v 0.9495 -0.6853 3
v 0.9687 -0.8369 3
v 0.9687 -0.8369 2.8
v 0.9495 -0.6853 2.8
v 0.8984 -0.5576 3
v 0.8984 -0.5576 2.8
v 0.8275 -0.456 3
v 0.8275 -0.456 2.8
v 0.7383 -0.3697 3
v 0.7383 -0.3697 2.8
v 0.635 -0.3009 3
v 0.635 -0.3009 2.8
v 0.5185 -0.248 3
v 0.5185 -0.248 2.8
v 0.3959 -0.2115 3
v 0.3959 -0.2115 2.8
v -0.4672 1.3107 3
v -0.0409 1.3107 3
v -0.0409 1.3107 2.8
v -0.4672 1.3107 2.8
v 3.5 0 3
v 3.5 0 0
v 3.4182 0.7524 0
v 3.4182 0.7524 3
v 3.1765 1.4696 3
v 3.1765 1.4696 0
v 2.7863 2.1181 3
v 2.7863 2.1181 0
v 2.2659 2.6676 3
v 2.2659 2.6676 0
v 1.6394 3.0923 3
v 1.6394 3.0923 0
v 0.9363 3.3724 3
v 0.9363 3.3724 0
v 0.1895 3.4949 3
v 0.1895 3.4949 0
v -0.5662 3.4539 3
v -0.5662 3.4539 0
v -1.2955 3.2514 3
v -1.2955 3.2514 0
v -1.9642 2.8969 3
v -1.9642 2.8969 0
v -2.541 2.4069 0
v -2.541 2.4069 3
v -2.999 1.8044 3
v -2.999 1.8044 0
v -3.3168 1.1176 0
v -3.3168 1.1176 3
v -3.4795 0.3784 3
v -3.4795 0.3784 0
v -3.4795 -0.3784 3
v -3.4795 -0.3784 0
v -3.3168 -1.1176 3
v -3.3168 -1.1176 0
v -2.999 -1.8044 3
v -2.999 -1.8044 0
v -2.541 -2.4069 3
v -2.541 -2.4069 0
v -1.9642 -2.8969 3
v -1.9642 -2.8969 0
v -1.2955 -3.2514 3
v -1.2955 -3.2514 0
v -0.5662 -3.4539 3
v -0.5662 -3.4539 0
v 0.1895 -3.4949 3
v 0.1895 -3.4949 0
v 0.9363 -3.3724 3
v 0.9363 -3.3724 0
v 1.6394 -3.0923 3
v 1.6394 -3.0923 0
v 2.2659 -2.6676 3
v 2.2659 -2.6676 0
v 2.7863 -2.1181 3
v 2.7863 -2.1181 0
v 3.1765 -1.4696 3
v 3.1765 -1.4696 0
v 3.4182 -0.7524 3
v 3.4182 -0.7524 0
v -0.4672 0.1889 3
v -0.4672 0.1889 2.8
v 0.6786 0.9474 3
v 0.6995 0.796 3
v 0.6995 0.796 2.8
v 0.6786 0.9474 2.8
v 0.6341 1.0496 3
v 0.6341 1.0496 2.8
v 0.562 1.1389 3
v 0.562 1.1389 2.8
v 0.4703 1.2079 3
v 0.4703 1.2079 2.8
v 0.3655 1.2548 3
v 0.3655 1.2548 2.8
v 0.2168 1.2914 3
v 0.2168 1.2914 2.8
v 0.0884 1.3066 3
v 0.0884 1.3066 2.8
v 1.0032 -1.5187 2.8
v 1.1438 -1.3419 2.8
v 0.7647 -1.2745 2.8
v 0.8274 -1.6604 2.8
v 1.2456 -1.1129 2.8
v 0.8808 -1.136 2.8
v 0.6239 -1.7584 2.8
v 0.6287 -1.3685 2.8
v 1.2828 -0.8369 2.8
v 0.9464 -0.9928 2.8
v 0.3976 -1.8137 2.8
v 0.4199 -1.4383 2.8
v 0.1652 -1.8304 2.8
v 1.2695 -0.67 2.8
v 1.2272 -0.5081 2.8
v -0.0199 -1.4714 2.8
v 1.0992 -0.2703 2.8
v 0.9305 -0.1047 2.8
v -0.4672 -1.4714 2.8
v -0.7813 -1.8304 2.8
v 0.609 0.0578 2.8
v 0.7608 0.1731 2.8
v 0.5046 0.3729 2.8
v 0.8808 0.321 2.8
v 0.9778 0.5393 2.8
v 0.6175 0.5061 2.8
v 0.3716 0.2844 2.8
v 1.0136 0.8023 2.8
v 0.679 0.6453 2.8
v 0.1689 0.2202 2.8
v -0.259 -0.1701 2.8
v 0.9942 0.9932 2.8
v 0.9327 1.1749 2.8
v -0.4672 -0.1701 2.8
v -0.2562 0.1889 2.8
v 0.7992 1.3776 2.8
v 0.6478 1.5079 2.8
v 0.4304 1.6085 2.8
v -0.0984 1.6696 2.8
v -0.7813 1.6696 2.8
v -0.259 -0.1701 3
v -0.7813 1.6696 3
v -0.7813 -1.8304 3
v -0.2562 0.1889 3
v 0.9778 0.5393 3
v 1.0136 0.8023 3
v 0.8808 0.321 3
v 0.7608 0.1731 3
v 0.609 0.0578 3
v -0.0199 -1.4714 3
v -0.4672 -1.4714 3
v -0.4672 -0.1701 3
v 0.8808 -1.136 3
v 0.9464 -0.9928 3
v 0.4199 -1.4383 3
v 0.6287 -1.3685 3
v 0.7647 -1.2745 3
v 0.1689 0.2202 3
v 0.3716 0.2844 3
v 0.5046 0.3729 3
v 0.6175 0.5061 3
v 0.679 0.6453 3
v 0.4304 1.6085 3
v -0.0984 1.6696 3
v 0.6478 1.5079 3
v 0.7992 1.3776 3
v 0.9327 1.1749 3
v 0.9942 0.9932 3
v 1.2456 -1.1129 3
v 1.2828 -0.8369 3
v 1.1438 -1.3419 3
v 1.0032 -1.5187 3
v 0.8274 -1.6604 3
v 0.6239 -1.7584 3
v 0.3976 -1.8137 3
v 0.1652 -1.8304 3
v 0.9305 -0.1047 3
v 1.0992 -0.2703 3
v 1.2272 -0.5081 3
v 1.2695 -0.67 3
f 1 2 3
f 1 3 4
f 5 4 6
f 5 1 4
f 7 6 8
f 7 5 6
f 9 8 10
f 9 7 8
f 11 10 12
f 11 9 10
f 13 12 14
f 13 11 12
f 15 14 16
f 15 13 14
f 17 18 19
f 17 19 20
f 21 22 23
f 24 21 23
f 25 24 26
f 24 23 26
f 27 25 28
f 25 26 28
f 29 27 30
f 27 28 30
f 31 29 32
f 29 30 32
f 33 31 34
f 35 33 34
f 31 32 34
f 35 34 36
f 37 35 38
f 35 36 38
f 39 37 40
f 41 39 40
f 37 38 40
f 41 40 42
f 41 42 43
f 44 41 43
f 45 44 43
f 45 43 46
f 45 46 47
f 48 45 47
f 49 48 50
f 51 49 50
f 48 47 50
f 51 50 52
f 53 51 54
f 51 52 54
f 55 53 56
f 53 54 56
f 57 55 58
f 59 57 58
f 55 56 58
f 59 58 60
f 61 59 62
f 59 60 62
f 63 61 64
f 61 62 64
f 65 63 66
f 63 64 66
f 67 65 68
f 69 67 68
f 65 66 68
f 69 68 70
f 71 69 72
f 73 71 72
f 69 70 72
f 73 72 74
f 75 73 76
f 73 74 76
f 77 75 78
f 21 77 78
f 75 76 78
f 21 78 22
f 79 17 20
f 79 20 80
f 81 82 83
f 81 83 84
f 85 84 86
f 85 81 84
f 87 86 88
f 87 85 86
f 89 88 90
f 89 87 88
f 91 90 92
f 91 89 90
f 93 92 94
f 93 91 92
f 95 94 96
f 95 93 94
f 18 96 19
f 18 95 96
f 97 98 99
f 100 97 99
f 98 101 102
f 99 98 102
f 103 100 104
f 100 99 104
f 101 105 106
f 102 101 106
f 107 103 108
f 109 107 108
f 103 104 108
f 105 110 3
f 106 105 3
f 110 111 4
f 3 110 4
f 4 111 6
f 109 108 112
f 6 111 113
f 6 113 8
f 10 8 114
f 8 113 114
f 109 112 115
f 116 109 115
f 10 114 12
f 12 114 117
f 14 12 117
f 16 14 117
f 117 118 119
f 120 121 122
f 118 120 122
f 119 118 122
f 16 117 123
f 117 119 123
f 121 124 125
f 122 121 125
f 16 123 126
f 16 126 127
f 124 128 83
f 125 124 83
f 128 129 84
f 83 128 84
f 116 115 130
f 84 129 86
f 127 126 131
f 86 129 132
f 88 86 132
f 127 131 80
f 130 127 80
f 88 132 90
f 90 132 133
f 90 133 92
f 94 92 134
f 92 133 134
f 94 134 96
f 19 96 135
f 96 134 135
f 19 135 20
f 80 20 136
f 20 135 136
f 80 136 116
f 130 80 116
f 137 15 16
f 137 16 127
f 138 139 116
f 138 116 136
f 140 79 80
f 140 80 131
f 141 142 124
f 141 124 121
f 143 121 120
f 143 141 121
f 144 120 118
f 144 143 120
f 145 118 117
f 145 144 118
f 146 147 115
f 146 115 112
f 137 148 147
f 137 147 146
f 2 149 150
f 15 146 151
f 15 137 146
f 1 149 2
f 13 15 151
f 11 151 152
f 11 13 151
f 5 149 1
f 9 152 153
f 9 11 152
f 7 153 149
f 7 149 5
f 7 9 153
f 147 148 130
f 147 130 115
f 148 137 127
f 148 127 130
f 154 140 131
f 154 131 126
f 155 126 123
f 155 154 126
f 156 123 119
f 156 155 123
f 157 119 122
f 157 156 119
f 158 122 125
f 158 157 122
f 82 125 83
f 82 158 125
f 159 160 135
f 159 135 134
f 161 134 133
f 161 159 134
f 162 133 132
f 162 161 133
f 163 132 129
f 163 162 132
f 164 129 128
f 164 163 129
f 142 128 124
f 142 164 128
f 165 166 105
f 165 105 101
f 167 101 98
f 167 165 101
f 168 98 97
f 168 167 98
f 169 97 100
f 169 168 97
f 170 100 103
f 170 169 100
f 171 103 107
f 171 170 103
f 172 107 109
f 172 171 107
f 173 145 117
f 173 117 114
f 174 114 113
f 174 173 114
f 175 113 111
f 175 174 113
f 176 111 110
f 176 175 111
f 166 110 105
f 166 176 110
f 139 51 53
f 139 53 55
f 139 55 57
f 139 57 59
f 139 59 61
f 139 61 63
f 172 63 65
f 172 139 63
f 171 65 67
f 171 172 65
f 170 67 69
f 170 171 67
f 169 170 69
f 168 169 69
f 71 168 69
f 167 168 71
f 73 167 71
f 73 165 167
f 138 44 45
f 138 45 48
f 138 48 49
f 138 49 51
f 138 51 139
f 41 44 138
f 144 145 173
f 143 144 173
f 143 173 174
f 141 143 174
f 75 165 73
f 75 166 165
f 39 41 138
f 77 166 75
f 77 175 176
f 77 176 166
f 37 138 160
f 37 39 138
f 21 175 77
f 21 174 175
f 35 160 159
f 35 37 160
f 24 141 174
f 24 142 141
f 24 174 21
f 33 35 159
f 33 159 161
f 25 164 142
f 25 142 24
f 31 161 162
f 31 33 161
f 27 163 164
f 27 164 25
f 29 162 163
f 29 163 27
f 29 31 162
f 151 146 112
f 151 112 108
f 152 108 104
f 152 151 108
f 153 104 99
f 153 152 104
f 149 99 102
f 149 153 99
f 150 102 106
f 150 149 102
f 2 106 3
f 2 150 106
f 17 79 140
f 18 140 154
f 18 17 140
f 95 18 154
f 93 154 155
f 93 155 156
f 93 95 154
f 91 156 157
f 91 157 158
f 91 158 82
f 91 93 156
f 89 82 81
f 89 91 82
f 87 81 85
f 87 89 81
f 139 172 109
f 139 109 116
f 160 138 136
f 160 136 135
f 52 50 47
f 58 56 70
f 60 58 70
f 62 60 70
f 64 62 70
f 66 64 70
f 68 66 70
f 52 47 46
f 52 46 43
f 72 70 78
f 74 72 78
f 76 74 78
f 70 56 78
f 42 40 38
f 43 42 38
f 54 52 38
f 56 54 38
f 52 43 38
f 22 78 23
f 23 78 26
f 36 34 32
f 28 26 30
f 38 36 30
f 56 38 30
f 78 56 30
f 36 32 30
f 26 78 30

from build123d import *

# Parameters (mm, degrees)
SKETCH1_R           = 3.5
BOSS_EXTRUDE1_DEPTH = 3
CUT_EXTRUDE1_DEPTH  = 0.2


with BuildPart() as part:
    # Sketch1 → Boss-Extrude1 (new body)
    with BuildSketch(Plane.XY):
        Circle(SKETCH1_R)
    extrude(amount=BOSS_EXTRUDE1_DEPTH)

    # Sketch2 → Cut-Extrude1 (cut)
    with BuildSketch(Plane.XY.offset(3)):
        with BuildLine():
            Line((-0.781290974, 1.669629579), (-0.098398346, 1.669629579))
            add(Edge.make_bspline(
                [(-0.098398346, 1.669629579), (-0.064969868, 1.669453828), (-0.000177158, 1.66911318), (0.094042284, 1.663830049), (0.182291095, 1.656626379), (0.264594867, 1.645196287), (0.34091557, 1.63140451), (0.411483207, 1.614702693), (0.476073379, 1.59467608), (0.553186116, 1.562829799), (0.641106776, 1.51550663), (0.736305169, 1.445578065), (0.817709408, 1.360045602), (0.887895726, 1.263562947), (0.943696845, 1.157427175), (0.984066143, 1.044167986), (1.009624018, 0.925246244), (1.012252452, 0.843603066), (1.013580821, 0.802341919)],
                knots=[0, 0, 0, 0, 0.00010027, 0.000194349, 0.000283026, 0.000365821, 0.000443519, 0.000515622, 0.000583254, 0.00064614, 0.000765662, 0.000881909, 0.000998927, 0.001118415, 0.001238844, 0.00135727, 0.001478274, 0.001601912, 0.001601912, 0.001601912, 0.001601912], degree=3))
            add(Edge.make_bspline(
                [(1.013580821, 0.802341919), (1.012487602, 0.763689363), (1.010339325, 0.687733446), (0.989796565, 0.576639337), (0.957635897, 0.470888118), (0.912930648, 0.370865732), (0.854828652, 0.278832119), (0.785970333, 0.194044853), (0.70289353, 0.120093796), (0.64065029, 0.078750894), (0.609033545, 0.057750572)],
                knots=[0, 0, 0, 0, 0.000115857, 0.00022767, 0.000337672, 0.000446877, 0.000555233, 0.000663318, 0.000773539, 0.000887324, 0.000887324, 0.000887324, 0.000887324], degree=3))
            add(Edge.make_bspline(
                [(0.609033545, 0.057750572), (0.648793972, 0.042485573), (0.72486552, 0.013279849), (0.829551532, -0.038355615), (0.919746377, -0.094517725), (0.996143523, -0.155849575), (1.061481178, -0.221958386), (1.11853412, -0.293813501), (1.167215494, -0.372352258), (1.208928417, -0.456755794), (1.241477174, -0.546162262), (1.265853078, -0.639733038), (1.279820527, -0.737132593), (1.281808168, -0.803417973), (1.28281159, -0.836880838)],
                knots=[0, 0, 0, 0, 0.000127722, 0.000244363, 0.000349599, 0.000445847, 0.000537565, 0.000627901, 0.000720503, 0.000814257, 0.000909859, 0.001005428, 0.001103887, 0.001204268, 0.001204268, 0.001204268, 0.001204268], degree=3))
            add(Edge.make_bspline(
                [(1.28281159, -0.836880838), (1.281834744, -0.87104771), (1.279912772, -0.938271988), (1.2657328, -1.037027123), (1.241723693, -1.131402069), (1.208652547, -1.222007252), (1.165490232, -1.308667386), (1.112962268, -1.39148065), (1.050330704, -1.469614981), (0.980267835, -1.543938604), (0.90100569, -1.610766391), (0.815489935, -1.670282098), (0.722643615, -1.71922816), (0.623991621, -1.760344182), (0.518427305, -1.79175138), (0.406424697, -1.813723954), (0.288080396, -1.828528991), (0.206870644, -1.829746196), (0.165223449, -1.830370421)],
                knots=[0, 0, 0, 0, 0.000102481, 0.000201635, 0.000298562, 0.000394165, 0.000490425, 0.000588455, 0.000687769, 0.000790423, 0.000894381, 0.000998232, 0.001102369, 0.001208616, 0.001318415, 0.001432129, 0.001550749, 0.00167562, 0.00167562, 0.00167562, 0.00167562], degree=3))
            Line((0.165223449, -1.830370421), (-0.781290974, -1.830370421))
            Line((-0.781290974, -1.830370421), (-0.781290974, 1.669629579))
        make_face()
        with BuildLine():
            Line((-0.46718841, 1.31065522), (-0.46718841, 0.188860348))
            Line((-0.46718841, 0.188860348), (-0.25615075, 0.188860348))
            add(Edge.make_bspline(
                [(-0.25615075, 0.188860348), (-0.225301955, 0.189260271), (-0.165695795, 0.190033004), (-0.079375899, 0.192246521), (0.000749119, 0.198444564), (0.074540952, 0.204640826), (0.141883396, 0.214715414), (0.202627258, 0.226707537), (0.257725855, 0.239390442), (0.3212654, 0.260959929), (0.393338349, 0.292837604), (0.470171453, 0.34230944), (0.537905923, 0.401233793), (0.59510311, 0.469224755), (0.641914581, 0.544090941), (0.674428296, 0.624637821), (0.69647558, 0.708857953), (0.698467112, 0.766676206), (0.699478256, 0.796031822)],
                knots=[0, 0, 0, 0, 9.2559e-05, 0.000178842, 0.000258967, 0.000333616, 0.000400942, 0.000463093, 0.000519379, 0.000570374, 0.000664201, 0.000755025, 0.000843472, 0.000932526, 0.001020669, 0.001107124, 0.001192318, 0.001280185, 0.001280185, 0.001280185, 0.001280185], degree=3))
            add(Edge.make_bspline(
                [(0.699478256, 0.796031822), (0.698952076, 0.815457594), (0.697919916, 0.853563366), (0.689466614, 0.90911272), (0.675099039, 0.961356473), (0.656644746, 1.011010583), (0.630856057, 1.056522433), (0.600492594, 1.099465629), (0.563806904, 1.138377747), (0.522049591, 1.174747246), (0.474040968, 1.206991774), (0.419809676, 1.235232537), (0.358621999, 1.257973313), (0.291509144, 1.277889466), (0.217438057, 1.29187776), (0.137263503, 1.303531147), (0.050328784, 1.309463889), (-0.009816318, 1.310249252), (-0.040906359, 1.31065522)],
                knots=[0, 0, 0, 0, 5.8261e-05, 0.000114285, 0.000168029, 0.000220632, 0.000272728, 0.000324483, 0.000378062, 0.000432741, 0.000490301, 0.000551137, 0.000615721, 0.000685833, 0.000760908, 0.00084162, 0.000928788, 0.00102206, 0.00102206, 0.00102206, 0.00102206], degree=3))
            Line((-0.040906359, 1.31065522), (-0.46718841, 1.31065522))
        make_face(mode=Mode.SUBTRACT)
        with BuildLine():
            Line((-0.46718841, -0.170114011), (-0.46718841, -1.471396062))
            Line((-0.46718841, -1.471396062), (-0.019872705, -1.471396062))
            add(Edge.make_bspline(
                [(-0.019872705, -1.471396062), (0.012146221, -1.471012315), (0.073858479, -1.470272692), (0.16295971, -1.467858138), (0.245542813, -1.462365862), (0.321230949, -1.453720012), (0.390841402, -1.444341563), (0.453539105, -1.431730282), (0.509832298, -1.417281322), (0.575106606, -1.39494715), (0.648610114, -1.360250679), (0.727820971, -1.307936452), (0.798247189, -1.245613144), (0.858052448, -1.17348223), (0.907065436, -1.095050903), (0.942720892, -1.011905553), (0.964711748, -0.925420026), (0.967373918, -0.866453313), (0.968709026, -0.836880838)],
                knots=[0, 0, 0, 0, 9.6064e-05, 0.000185151, 0.000267373, 0.000344257, 0.000413665, 0.000478015, 0.000536005, 0.000587888, 0.000684801, 0.000778918, 0.000871787, 0.000965866, 0.001059062, 0.00114827, 0.001236355, 0.001324974, 0.001324974, 0.001324974, 0.001324974], degree=3))
            add(Edge.make_bspline(
                [(0.968709026, -0.836880838), (0.968432921, -0.818387497), (0.967885166, -0.781699116), (0.959624551, -0.727783296), (0.947610682, -0.675557423), (0.932079248, -0.624879683), (0.909459781, -0.576666306), (0.883053236, -0.529963747), (0.852091834, -0.484710267), (0.803847668, -0.427498014), (0.733675683, -0.361581001), (0.633968908, -0.297043499), (0.52059661, -0.244995692), (0.438369117, -0.222896215), (0.395892519, -0.211480197)],
                knots=[0, 0, 0, 0, 5.5429e-05, 0.000109963, 0.000163198, 0.000216191, 0.000268588, 0.000322593, 0.000377046, 0.000432793, 0.000546889, 0.000664343, 0.000787646, 0.000919405, 0.000919405, 0.000919405, 0.000919405], degree=3))
            add(Edge.make_bspline(
                [(0.395892519, -0.211480197), (0.378863423, -0.208025113), (0.341940831, -0.200533778), (0.281733251, -0.192626075), (0.212997382, -0.185581015), (0.135574504, -0.180369857), (0.049366663, -0.174983314), (-0.045810255, -0.172888493), (-0.14956757, -0.170389233), (-0.221559942, -0.170208098), (-0.258955237, -0.170114011)],
                knots=[0, 0, 0, 0, 5.2115e-05, 0.000112995, 0.000182062, 0.000259389, 0.000345767, 0.00044116, 0.000544948, 0.000657129, 0.000657129, 0.000657129, 0.000657129], degree=3))
            Line((-0.258955237, -0.170114011), (-0.46718841, -0.170114011))
        make_face(mode=Mode.SUBTRACT)
    extrude(amount=-CUT_EXTRUDE1_DEPTH, mode=Mode.SUBTRACT)


solid = part.part
